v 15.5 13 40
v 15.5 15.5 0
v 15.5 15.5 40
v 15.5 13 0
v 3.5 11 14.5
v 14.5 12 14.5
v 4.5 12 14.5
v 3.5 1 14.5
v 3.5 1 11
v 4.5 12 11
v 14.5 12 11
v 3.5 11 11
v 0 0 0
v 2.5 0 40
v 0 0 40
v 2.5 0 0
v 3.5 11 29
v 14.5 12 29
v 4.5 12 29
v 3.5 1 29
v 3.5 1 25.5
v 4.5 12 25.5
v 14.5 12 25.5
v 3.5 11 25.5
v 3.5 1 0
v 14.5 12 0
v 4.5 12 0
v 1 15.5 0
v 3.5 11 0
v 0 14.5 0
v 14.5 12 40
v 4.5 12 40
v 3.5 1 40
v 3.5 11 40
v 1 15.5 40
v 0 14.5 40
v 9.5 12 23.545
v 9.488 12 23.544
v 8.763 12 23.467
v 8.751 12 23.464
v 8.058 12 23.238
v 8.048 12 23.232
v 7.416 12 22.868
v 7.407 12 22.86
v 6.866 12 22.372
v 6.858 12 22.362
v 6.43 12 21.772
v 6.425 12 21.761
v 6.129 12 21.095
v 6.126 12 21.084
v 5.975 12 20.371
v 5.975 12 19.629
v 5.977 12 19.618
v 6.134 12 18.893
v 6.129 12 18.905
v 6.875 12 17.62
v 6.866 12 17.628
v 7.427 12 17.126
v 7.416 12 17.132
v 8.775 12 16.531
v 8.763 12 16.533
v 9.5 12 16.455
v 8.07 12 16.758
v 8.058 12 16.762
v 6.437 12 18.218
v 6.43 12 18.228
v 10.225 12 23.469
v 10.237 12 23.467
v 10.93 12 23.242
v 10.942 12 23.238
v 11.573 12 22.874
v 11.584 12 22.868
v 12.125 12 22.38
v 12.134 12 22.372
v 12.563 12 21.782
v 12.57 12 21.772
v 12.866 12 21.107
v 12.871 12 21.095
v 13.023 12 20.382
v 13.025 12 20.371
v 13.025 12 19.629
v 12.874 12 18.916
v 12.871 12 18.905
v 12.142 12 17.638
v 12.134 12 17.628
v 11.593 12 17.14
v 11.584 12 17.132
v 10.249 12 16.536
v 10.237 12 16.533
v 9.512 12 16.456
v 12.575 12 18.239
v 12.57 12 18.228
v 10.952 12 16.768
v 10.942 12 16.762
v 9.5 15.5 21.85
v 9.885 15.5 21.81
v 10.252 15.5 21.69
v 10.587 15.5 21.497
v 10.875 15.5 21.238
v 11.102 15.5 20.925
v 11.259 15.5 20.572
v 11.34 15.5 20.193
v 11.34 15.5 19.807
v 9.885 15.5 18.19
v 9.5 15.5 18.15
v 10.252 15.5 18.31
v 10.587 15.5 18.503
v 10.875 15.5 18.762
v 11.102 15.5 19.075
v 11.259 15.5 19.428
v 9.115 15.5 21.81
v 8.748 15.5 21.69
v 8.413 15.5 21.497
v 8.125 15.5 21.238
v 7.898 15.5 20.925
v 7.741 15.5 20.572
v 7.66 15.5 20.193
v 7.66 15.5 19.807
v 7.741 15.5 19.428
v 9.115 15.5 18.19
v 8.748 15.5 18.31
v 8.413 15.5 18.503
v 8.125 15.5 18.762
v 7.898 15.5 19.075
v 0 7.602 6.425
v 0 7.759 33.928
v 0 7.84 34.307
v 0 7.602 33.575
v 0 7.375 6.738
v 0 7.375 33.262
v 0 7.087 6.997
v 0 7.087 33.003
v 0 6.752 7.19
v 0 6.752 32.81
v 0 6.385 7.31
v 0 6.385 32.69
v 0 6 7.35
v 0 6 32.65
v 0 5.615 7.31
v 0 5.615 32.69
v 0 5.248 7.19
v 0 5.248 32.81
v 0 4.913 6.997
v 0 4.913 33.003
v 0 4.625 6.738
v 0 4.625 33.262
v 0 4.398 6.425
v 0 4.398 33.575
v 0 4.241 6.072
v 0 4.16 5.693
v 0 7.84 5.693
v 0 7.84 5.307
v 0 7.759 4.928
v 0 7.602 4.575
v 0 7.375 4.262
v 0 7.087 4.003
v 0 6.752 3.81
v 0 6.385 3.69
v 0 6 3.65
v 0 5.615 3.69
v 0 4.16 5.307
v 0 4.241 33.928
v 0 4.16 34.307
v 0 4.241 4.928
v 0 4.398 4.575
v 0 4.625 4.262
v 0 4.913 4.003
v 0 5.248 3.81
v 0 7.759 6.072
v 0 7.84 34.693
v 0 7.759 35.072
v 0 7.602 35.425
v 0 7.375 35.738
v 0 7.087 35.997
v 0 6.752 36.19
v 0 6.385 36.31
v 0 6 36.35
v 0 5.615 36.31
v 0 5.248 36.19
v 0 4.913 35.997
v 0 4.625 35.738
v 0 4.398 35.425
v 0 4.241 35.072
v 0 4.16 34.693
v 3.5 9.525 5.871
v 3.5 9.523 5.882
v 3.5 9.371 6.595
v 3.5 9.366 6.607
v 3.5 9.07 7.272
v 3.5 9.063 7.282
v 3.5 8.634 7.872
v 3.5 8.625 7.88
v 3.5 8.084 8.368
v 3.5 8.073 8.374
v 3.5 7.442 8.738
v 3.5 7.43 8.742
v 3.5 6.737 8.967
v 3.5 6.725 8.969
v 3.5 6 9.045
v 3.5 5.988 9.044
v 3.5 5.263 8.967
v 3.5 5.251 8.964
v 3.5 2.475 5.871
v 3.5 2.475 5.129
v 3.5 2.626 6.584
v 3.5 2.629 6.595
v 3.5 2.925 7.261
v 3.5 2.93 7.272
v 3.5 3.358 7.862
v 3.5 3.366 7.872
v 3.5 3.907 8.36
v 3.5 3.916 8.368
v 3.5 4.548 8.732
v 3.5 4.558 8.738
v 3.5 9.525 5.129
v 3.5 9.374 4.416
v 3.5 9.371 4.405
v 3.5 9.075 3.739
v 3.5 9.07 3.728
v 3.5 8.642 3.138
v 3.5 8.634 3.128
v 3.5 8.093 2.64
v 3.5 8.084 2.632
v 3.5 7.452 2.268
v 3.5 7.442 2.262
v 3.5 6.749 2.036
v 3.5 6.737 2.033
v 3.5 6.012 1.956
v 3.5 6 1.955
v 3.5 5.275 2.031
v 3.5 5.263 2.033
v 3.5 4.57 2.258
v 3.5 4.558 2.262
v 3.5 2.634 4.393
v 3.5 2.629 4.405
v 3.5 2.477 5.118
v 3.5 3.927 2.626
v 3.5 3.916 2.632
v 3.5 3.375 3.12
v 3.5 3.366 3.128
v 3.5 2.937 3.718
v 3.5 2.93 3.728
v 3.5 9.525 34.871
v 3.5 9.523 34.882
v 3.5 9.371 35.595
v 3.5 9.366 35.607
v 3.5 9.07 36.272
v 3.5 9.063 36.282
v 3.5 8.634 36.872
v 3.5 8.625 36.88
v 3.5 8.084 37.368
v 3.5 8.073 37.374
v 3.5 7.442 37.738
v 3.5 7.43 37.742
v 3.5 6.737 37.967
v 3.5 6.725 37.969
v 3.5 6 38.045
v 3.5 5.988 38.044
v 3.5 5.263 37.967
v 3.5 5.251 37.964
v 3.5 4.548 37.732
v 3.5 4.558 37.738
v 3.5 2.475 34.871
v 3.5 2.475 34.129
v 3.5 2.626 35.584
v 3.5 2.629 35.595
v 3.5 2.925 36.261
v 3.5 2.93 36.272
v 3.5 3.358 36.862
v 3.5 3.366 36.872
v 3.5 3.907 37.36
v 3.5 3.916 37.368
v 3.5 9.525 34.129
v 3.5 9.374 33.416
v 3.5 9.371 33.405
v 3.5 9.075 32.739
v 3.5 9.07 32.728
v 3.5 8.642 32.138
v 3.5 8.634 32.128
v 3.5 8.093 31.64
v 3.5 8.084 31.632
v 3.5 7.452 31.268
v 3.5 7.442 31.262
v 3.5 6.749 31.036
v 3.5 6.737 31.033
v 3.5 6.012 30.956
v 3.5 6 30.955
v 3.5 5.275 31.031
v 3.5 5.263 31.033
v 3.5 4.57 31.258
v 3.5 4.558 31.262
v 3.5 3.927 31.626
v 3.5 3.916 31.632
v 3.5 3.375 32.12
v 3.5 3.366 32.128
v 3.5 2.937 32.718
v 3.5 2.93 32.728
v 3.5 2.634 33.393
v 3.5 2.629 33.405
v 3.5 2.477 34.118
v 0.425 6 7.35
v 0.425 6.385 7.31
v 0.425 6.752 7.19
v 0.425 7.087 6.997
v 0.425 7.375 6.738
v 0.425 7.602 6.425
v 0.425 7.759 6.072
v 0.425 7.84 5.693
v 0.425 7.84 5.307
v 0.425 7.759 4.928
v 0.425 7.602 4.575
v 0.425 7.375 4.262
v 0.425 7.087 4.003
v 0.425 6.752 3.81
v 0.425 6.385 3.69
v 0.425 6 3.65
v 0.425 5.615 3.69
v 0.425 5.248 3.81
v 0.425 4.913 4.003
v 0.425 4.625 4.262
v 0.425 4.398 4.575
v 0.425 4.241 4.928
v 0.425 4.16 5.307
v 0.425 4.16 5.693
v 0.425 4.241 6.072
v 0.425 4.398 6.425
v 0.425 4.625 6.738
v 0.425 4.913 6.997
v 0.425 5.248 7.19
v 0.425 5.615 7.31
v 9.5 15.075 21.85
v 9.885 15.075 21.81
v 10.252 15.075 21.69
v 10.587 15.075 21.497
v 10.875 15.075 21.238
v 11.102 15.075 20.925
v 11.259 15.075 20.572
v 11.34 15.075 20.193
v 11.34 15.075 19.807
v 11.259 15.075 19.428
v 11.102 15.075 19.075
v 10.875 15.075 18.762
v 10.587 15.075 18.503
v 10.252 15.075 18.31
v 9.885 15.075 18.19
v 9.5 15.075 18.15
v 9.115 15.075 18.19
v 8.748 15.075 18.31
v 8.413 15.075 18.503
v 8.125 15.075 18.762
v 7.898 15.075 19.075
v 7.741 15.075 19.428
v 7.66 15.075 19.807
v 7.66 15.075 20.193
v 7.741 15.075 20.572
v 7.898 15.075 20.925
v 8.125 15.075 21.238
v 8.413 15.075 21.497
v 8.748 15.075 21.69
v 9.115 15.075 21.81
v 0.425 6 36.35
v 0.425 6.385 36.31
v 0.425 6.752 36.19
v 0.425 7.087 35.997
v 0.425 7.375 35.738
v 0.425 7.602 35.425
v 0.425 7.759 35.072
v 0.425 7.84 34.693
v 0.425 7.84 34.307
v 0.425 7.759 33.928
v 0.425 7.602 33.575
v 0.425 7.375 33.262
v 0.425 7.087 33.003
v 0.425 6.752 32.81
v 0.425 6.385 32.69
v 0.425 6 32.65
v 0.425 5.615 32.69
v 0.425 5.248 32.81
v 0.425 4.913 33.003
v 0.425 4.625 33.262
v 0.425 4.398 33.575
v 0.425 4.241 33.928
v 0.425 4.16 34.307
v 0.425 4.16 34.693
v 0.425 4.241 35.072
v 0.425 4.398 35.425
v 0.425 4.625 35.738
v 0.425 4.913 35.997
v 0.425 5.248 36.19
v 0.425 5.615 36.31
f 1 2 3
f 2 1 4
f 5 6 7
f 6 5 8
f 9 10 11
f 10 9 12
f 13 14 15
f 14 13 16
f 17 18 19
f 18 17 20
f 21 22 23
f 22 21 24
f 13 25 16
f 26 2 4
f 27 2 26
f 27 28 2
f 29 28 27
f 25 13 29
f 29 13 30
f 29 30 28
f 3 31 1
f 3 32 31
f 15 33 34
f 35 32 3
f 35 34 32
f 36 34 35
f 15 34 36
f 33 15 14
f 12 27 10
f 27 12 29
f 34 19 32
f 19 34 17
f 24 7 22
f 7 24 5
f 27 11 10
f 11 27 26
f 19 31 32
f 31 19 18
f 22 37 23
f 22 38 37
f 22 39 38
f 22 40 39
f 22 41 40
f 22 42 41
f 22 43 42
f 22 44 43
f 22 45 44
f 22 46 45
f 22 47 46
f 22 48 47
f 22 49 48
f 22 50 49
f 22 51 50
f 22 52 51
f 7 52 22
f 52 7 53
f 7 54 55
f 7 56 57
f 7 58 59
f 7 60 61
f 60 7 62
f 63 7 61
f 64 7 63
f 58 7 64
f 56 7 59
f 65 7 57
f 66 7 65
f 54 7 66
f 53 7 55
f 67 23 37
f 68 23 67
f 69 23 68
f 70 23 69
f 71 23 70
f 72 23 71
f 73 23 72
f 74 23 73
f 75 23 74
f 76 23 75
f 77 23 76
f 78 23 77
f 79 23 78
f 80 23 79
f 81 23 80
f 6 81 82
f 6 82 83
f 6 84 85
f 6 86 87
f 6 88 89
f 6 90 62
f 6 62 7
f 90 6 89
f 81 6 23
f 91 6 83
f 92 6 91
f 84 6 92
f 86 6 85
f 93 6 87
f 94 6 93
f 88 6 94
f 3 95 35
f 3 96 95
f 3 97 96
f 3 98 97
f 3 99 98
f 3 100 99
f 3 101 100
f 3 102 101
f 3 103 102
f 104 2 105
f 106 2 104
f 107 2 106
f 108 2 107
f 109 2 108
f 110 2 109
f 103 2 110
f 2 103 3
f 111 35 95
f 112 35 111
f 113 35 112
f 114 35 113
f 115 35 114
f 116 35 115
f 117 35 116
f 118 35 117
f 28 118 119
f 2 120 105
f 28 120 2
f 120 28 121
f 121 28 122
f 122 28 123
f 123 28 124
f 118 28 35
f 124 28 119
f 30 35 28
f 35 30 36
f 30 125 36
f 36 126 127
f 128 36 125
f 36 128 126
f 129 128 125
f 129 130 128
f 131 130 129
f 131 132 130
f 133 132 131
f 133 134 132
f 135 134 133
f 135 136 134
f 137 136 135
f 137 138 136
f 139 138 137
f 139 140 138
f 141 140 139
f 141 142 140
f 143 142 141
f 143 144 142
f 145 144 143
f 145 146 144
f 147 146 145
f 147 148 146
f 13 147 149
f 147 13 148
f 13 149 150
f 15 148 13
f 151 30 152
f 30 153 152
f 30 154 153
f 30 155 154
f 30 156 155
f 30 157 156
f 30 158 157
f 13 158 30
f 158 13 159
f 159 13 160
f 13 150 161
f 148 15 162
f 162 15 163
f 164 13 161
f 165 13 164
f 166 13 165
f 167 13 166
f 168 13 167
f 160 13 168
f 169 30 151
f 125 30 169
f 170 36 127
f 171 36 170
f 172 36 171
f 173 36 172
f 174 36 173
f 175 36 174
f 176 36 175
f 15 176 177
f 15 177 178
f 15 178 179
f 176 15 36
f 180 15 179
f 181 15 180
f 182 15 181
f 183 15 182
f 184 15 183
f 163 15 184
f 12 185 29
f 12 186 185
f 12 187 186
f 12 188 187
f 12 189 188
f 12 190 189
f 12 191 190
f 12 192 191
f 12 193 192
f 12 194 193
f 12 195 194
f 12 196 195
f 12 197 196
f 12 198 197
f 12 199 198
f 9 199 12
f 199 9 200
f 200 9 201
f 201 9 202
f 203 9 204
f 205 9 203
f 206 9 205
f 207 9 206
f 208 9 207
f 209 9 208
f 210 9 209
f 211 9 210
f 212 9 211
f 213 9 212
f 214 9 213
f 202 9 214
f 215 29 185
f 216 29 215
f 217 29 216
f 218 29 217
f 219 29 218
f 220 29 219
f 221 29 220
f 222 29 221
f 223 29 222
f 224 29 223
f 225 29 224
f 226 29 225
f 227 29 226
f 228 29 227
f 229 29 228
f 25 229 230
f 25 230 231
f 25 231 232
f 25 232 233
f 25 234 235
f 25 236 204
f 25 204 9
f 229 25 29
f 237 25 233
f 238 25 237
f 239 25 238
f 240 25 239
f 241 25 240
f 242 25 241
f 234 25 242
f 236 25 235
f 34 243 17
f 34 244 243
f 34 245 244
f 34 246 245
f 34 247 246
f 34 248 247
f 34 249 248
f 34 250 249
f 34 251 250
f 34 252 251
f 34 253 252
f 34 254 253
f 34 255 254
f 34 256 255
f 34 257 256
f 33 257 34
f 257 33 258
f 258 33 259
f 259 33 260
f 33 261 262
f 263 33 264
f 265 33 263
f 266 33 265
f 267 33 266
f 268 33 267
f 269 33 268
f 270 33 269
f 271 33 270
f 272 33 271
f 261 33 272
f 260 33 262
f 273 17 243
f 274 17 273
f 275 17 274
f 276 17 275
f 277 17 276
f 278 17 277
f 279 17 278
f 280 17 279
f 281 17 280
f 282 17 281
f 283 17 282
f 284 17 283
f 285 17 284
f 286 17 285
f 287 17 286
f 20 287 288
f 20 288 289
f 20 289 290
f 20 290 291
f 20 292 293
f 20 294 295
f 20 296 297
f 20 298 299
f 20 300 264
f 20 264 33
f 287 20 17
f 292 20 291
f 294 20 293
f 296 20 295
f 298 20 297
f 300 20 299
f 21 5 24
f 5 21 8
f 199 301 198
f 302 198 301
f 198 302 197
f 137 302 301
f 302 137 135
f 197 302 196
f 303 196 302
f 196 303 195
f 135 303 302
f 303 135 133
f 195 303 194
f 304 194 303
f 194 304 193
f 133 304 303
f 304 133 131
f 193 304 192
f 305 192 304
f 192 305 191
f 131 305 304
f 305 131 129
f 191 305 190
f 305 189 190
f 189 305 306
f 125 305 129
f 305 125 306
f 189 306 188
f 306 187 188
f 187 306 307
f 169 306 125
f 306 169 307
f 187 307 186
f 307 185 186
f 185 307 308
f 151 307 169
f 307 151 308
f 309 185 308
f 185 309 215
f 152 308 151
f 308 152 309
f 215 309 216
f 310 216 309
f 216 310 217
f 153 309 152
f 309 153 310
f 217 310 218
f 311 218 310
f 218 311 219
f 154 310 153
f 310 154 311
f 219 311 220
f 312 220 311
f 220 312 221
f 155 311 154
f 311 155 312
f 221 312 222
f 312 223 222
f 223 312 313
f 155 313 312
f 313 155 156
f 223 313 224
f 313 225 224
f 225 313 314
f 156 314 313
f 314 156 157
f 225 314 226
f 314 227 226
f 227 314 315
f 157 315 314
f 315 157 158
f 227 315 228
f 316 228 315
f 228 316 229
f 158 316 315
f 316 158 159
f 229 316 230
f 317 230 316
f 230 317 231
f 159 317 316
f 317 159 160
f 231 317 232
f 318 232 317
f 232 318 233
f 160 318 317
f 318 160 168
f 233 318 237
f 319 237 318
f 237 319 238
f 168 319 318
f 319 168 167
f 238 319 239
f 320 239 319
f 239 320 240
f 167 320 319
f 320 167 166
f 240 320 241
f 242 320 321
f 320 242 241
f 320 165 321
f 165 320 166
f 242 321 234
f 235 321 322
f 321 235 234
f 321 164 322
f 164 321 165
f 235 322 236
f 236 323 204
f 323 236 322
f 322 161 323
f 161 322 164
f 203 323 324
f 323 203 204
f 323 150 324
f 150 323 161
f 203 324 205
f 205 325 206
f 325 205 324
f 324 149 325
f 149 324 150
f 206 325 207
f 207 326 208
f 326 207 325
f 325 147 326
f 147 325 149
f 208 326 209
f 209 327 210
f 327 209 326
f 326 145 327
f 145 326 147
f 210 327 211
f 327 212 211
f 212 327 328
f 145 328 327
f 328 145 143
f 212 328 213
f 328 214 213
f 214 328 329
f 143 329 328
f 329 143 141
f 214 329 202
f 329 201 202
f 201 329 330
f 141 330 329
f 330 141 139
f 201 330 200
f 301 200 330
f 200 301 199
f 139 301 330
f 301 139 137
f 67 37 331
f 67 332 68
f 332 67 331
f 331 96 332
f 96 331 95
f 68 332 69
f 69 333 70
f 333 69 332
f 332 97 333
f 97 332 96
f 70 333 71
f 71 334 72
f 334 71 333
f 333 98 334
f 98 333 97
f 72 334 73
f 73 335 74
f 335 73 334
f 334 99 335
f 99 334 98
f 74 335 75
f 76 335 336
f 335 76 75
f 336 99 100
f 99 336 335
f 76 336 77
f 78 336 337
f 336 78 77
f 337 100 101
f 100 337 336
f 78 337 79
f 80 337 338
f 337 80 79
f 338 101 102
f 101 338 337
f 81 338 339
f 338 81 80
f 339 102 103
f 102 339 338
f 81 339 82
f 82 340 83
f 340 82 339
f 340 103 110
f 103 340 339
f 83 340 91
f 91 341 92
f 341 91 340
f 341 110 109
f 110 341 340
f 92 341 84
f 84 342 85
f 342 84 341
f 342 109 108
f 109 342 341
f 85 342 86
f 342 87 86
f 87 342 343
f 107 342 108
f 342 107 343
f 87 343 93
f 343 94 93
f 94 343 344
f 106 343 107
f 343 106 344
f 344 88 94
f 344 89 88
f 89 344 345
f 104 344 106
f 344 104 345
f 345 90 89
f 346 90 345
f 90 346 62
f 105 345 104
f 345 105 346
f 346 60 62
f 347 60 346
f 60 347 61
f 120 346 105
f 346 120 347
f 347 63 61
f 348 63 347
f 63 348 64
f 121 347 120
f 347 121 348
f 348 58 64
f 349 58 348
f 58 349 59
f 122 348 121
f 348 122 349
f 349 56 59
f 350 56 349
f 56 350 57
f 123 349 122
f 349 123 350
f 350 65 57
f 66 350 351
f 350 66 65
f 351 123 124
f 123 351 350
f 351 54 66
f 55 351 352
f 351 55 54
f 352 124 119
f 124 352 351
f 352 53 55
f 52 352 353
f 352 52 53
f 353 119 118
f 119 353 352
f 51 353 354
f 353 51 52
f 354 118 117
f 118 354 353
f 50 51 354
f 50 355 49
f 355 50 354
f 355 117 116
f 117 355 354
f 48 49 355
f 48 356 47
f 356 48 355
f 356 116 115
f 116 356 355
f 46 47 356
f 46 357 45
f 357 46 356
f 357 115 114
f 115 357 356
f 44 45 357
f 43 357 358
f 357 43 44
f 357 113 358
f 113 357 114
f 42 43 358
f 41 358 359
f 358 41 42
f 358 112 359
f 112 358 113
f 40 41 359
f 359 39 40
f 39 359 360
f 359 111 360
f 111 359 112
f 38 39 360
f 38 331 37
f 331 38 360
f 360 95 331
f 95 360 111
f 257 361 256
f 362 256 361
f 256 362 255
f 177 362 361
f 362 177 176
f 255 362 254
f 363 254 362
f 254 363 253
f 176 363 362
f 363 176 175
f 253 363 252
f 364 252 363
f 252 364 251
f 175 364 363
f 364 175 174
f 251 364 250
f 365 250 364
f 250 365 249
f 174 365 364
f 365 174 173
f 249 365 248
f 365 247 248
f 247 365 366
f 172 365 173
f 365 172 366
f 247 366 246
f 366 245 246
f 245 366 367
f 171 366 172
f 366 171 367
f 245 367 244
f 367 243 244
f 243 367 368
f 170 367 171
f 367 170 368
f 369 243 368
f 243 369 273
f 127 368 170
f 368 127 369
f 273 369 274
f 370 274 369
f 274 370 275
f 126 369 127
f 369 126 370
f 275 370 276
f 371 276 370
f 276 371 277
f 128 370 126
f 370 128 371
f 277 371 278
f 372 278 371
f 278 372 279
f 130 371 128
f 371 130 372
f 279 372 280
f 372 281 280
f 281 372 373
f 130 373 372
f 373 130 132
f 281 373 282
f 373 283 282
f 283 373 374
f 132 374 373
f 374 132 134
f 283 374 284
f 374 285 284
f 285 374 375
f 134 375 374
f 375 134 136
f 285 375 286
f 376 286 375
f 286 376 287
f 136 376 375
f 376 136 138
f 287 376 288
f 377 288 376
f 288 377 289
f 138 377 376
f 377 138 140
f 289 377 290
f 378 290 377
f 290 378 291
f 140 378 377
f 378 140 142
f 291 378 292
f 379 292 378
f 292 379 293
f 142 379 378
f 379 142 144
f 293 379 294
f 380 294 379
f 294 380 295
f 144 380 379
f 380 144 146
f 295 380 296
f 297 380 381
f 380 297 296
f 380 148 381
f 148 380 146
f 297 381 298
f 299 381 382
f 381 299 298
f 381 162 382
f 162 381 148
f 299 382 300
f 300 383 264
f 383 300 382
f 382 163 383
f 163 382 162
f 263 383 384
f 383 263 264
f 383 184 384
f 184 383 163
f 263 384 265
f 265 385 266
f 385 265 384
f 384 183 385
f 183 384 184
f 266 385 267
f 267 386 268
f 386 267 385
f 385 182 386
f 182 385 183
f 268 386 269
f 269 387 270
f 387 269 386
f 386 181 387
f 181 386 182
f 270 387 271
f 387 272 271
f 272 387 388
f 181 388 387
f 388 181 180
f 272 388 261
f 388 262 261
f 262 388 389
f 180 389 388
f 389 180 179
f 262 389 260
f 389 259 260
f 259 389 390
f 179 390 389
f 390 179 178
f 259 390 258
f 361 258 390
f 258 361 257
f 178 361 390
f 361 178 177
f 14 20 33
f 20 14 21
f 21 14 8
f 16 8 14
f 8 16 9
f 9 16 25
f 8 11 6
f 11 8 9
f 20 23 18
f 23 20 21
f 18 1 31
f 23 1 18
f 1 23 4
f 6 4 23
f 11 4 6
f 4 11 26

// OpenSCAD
// file: Parts/Screw.scad
// created by IndiePandaaaaa | Lukas

function cone_diameter(diameter) = diameter * 2;

function cone_height(diameter) = diameter * 0.85;

module screw(diameter, length, cutout_sample = false, fs = 0.1, fa = 1) {
    //$fs = 0.1; [size in mm] | $fa = 1; [degrees]
    //$fn = 100; [defined faces]

    module base_model(diameter, length, cone_height, cone_diameter, offset = 0, fs = 0.1, fa = 1) {
        rotate_extrude($fs = fs) {
            polygon([
                    [0, 0],
                    [(diameter + offset) / 2, 0],
                    [(diameter + offset) / 2, (length + offset) - (cone_height + offset)],
                    [(cone_diameter + offset) / 2, length + offset],
                    [0, length + offset],
                ]);
        }
    }

    if (length < diameter) {
        echo("Screw is too short");
        length = diameter + 1;
        echo("New length is: ", length);
    }

    if (!cutout_sample) {
        translate([0, 0, - length])
            difference() {
                base_model(diameter, length, cone_height(diameter), cone_diameter(diameter));

                // top cross part
                translate([0, 0, length + 0.1 - (cone_height(diameter) - diameter / 2)])
                    difference() {
                        rotate([0, 0, 45])
                            rotate_extrude($fn = 4) {
                                polygon([
                                        [0, 0],
                                        [diameter * 1.4 / 2, 0],
                                        [cone_diameter(diameter) / 2, cone_height(diameter) - diameter / 2],
                                        [0, cone_height(diameter) - diameter / 2],
                                    ]);
                            }
                        for (i = [0 : 1 : 3]) {
                            rotate([0, 0, 90 * i])
                                translate([diameter / 3.18 / 2, diameter / 3.18 / 2, - 0.1])
                                    cube(cone_height(diameter) + 0.2);
                        }
                    }
            }
    } else {
        offset = 0.2;
        translate([0, 0, - length - offset / 2])
            base_model(diameter, length, cone_height(diameter), cone_diameter(diameter), offset);
    }
}

screw(3.5, 12);
// main file
// created by IndiePandaaaaa | Lukas

use <Parts/Screw.scad>

MODEL_TOLERANCE = 0.15;

MATERIAL_THICKNESS = 3.5;
CHAMFER = 1;

WIDTH = 40; // WOOD - CHAMFER
SIDES = 12 + MATERIAL_THICKNESS;

SCREWS = 3;
SCREW_DIAMETER = 3.5;

SOLIDIFIER = SCREWS - 1;

difference() {
    width_inbetween = (WIDTH - MATERIAL_THICKNESS * SOLIDIFIER) / SCREWS;
    union() {
        linear_extrude(WIDTH) {
            polygon([
                    [0, 0],
                    [MATERIAL_THICKNESS, 0],
                    [MATERIAL_THICKNESS, SIDES - MATERIAL_THICKNESS - CHAMFER],
                    [MATERIAL_THICKNESS + CHAMFER, SIDES - MATERIAL_THICKNESS],
                    [SIDES, SIDES - MATERIAL_THICKNESS],
                    [SIDES, SIDES],
                    [CHAMFER, SIDES],
                    [0, SIDES - CHAMFER],
                ]);
        }

        for (i = [1:SOLIDIFIER]) {
            offset_z_solidifier = width_inbetween * i + MATERIAL_THICKNESS * (i - 1);
            translate([CHAMFER, 0, offset_z_solidifier])
                cube([SIDES - CHAMFER, SIDES - CHAMFER, MATERIAL_THICKNESS]);
        }
    }
    translate([MATERIAL_THICKNESS - CHAMFER, 0, 0]) rotate([0, 0, - 45]) cube(WIDTH);

    for (i = [0:SCREWS - 1]) {
        offset_z_screw = width_inbetween / 2 + (MATERIAL_THICKNESS + width_inbetween) * i;
        rotation = [0, 90, 0];
        translation = [MATERIAL_THICKNESS, (SIDES - MATERIAL_THICKNESS) / 2, offset_z_screw];

        if (i % 2 == 1) {
            echo(i);
            rotation = [0, 90, - 90];
            translation = [MATERIAL_THICKNESS + (SIDES - MATERIAL_THICKNESS) / 2, SIDES - MATERIAL_THICKNESS,
                offset_z_screw];

            translate(translation)
                rotate(rotation)
                    screw(SCREW_DIAMETER, MATERIAL_THICKNESS * 2, true);
        } else {
            translate(translation)
                rotate(rotation)
                    screw(SCREW_DIAMETER, MATERIAL_THICKNESS * 2, true);
        }
    }
}
